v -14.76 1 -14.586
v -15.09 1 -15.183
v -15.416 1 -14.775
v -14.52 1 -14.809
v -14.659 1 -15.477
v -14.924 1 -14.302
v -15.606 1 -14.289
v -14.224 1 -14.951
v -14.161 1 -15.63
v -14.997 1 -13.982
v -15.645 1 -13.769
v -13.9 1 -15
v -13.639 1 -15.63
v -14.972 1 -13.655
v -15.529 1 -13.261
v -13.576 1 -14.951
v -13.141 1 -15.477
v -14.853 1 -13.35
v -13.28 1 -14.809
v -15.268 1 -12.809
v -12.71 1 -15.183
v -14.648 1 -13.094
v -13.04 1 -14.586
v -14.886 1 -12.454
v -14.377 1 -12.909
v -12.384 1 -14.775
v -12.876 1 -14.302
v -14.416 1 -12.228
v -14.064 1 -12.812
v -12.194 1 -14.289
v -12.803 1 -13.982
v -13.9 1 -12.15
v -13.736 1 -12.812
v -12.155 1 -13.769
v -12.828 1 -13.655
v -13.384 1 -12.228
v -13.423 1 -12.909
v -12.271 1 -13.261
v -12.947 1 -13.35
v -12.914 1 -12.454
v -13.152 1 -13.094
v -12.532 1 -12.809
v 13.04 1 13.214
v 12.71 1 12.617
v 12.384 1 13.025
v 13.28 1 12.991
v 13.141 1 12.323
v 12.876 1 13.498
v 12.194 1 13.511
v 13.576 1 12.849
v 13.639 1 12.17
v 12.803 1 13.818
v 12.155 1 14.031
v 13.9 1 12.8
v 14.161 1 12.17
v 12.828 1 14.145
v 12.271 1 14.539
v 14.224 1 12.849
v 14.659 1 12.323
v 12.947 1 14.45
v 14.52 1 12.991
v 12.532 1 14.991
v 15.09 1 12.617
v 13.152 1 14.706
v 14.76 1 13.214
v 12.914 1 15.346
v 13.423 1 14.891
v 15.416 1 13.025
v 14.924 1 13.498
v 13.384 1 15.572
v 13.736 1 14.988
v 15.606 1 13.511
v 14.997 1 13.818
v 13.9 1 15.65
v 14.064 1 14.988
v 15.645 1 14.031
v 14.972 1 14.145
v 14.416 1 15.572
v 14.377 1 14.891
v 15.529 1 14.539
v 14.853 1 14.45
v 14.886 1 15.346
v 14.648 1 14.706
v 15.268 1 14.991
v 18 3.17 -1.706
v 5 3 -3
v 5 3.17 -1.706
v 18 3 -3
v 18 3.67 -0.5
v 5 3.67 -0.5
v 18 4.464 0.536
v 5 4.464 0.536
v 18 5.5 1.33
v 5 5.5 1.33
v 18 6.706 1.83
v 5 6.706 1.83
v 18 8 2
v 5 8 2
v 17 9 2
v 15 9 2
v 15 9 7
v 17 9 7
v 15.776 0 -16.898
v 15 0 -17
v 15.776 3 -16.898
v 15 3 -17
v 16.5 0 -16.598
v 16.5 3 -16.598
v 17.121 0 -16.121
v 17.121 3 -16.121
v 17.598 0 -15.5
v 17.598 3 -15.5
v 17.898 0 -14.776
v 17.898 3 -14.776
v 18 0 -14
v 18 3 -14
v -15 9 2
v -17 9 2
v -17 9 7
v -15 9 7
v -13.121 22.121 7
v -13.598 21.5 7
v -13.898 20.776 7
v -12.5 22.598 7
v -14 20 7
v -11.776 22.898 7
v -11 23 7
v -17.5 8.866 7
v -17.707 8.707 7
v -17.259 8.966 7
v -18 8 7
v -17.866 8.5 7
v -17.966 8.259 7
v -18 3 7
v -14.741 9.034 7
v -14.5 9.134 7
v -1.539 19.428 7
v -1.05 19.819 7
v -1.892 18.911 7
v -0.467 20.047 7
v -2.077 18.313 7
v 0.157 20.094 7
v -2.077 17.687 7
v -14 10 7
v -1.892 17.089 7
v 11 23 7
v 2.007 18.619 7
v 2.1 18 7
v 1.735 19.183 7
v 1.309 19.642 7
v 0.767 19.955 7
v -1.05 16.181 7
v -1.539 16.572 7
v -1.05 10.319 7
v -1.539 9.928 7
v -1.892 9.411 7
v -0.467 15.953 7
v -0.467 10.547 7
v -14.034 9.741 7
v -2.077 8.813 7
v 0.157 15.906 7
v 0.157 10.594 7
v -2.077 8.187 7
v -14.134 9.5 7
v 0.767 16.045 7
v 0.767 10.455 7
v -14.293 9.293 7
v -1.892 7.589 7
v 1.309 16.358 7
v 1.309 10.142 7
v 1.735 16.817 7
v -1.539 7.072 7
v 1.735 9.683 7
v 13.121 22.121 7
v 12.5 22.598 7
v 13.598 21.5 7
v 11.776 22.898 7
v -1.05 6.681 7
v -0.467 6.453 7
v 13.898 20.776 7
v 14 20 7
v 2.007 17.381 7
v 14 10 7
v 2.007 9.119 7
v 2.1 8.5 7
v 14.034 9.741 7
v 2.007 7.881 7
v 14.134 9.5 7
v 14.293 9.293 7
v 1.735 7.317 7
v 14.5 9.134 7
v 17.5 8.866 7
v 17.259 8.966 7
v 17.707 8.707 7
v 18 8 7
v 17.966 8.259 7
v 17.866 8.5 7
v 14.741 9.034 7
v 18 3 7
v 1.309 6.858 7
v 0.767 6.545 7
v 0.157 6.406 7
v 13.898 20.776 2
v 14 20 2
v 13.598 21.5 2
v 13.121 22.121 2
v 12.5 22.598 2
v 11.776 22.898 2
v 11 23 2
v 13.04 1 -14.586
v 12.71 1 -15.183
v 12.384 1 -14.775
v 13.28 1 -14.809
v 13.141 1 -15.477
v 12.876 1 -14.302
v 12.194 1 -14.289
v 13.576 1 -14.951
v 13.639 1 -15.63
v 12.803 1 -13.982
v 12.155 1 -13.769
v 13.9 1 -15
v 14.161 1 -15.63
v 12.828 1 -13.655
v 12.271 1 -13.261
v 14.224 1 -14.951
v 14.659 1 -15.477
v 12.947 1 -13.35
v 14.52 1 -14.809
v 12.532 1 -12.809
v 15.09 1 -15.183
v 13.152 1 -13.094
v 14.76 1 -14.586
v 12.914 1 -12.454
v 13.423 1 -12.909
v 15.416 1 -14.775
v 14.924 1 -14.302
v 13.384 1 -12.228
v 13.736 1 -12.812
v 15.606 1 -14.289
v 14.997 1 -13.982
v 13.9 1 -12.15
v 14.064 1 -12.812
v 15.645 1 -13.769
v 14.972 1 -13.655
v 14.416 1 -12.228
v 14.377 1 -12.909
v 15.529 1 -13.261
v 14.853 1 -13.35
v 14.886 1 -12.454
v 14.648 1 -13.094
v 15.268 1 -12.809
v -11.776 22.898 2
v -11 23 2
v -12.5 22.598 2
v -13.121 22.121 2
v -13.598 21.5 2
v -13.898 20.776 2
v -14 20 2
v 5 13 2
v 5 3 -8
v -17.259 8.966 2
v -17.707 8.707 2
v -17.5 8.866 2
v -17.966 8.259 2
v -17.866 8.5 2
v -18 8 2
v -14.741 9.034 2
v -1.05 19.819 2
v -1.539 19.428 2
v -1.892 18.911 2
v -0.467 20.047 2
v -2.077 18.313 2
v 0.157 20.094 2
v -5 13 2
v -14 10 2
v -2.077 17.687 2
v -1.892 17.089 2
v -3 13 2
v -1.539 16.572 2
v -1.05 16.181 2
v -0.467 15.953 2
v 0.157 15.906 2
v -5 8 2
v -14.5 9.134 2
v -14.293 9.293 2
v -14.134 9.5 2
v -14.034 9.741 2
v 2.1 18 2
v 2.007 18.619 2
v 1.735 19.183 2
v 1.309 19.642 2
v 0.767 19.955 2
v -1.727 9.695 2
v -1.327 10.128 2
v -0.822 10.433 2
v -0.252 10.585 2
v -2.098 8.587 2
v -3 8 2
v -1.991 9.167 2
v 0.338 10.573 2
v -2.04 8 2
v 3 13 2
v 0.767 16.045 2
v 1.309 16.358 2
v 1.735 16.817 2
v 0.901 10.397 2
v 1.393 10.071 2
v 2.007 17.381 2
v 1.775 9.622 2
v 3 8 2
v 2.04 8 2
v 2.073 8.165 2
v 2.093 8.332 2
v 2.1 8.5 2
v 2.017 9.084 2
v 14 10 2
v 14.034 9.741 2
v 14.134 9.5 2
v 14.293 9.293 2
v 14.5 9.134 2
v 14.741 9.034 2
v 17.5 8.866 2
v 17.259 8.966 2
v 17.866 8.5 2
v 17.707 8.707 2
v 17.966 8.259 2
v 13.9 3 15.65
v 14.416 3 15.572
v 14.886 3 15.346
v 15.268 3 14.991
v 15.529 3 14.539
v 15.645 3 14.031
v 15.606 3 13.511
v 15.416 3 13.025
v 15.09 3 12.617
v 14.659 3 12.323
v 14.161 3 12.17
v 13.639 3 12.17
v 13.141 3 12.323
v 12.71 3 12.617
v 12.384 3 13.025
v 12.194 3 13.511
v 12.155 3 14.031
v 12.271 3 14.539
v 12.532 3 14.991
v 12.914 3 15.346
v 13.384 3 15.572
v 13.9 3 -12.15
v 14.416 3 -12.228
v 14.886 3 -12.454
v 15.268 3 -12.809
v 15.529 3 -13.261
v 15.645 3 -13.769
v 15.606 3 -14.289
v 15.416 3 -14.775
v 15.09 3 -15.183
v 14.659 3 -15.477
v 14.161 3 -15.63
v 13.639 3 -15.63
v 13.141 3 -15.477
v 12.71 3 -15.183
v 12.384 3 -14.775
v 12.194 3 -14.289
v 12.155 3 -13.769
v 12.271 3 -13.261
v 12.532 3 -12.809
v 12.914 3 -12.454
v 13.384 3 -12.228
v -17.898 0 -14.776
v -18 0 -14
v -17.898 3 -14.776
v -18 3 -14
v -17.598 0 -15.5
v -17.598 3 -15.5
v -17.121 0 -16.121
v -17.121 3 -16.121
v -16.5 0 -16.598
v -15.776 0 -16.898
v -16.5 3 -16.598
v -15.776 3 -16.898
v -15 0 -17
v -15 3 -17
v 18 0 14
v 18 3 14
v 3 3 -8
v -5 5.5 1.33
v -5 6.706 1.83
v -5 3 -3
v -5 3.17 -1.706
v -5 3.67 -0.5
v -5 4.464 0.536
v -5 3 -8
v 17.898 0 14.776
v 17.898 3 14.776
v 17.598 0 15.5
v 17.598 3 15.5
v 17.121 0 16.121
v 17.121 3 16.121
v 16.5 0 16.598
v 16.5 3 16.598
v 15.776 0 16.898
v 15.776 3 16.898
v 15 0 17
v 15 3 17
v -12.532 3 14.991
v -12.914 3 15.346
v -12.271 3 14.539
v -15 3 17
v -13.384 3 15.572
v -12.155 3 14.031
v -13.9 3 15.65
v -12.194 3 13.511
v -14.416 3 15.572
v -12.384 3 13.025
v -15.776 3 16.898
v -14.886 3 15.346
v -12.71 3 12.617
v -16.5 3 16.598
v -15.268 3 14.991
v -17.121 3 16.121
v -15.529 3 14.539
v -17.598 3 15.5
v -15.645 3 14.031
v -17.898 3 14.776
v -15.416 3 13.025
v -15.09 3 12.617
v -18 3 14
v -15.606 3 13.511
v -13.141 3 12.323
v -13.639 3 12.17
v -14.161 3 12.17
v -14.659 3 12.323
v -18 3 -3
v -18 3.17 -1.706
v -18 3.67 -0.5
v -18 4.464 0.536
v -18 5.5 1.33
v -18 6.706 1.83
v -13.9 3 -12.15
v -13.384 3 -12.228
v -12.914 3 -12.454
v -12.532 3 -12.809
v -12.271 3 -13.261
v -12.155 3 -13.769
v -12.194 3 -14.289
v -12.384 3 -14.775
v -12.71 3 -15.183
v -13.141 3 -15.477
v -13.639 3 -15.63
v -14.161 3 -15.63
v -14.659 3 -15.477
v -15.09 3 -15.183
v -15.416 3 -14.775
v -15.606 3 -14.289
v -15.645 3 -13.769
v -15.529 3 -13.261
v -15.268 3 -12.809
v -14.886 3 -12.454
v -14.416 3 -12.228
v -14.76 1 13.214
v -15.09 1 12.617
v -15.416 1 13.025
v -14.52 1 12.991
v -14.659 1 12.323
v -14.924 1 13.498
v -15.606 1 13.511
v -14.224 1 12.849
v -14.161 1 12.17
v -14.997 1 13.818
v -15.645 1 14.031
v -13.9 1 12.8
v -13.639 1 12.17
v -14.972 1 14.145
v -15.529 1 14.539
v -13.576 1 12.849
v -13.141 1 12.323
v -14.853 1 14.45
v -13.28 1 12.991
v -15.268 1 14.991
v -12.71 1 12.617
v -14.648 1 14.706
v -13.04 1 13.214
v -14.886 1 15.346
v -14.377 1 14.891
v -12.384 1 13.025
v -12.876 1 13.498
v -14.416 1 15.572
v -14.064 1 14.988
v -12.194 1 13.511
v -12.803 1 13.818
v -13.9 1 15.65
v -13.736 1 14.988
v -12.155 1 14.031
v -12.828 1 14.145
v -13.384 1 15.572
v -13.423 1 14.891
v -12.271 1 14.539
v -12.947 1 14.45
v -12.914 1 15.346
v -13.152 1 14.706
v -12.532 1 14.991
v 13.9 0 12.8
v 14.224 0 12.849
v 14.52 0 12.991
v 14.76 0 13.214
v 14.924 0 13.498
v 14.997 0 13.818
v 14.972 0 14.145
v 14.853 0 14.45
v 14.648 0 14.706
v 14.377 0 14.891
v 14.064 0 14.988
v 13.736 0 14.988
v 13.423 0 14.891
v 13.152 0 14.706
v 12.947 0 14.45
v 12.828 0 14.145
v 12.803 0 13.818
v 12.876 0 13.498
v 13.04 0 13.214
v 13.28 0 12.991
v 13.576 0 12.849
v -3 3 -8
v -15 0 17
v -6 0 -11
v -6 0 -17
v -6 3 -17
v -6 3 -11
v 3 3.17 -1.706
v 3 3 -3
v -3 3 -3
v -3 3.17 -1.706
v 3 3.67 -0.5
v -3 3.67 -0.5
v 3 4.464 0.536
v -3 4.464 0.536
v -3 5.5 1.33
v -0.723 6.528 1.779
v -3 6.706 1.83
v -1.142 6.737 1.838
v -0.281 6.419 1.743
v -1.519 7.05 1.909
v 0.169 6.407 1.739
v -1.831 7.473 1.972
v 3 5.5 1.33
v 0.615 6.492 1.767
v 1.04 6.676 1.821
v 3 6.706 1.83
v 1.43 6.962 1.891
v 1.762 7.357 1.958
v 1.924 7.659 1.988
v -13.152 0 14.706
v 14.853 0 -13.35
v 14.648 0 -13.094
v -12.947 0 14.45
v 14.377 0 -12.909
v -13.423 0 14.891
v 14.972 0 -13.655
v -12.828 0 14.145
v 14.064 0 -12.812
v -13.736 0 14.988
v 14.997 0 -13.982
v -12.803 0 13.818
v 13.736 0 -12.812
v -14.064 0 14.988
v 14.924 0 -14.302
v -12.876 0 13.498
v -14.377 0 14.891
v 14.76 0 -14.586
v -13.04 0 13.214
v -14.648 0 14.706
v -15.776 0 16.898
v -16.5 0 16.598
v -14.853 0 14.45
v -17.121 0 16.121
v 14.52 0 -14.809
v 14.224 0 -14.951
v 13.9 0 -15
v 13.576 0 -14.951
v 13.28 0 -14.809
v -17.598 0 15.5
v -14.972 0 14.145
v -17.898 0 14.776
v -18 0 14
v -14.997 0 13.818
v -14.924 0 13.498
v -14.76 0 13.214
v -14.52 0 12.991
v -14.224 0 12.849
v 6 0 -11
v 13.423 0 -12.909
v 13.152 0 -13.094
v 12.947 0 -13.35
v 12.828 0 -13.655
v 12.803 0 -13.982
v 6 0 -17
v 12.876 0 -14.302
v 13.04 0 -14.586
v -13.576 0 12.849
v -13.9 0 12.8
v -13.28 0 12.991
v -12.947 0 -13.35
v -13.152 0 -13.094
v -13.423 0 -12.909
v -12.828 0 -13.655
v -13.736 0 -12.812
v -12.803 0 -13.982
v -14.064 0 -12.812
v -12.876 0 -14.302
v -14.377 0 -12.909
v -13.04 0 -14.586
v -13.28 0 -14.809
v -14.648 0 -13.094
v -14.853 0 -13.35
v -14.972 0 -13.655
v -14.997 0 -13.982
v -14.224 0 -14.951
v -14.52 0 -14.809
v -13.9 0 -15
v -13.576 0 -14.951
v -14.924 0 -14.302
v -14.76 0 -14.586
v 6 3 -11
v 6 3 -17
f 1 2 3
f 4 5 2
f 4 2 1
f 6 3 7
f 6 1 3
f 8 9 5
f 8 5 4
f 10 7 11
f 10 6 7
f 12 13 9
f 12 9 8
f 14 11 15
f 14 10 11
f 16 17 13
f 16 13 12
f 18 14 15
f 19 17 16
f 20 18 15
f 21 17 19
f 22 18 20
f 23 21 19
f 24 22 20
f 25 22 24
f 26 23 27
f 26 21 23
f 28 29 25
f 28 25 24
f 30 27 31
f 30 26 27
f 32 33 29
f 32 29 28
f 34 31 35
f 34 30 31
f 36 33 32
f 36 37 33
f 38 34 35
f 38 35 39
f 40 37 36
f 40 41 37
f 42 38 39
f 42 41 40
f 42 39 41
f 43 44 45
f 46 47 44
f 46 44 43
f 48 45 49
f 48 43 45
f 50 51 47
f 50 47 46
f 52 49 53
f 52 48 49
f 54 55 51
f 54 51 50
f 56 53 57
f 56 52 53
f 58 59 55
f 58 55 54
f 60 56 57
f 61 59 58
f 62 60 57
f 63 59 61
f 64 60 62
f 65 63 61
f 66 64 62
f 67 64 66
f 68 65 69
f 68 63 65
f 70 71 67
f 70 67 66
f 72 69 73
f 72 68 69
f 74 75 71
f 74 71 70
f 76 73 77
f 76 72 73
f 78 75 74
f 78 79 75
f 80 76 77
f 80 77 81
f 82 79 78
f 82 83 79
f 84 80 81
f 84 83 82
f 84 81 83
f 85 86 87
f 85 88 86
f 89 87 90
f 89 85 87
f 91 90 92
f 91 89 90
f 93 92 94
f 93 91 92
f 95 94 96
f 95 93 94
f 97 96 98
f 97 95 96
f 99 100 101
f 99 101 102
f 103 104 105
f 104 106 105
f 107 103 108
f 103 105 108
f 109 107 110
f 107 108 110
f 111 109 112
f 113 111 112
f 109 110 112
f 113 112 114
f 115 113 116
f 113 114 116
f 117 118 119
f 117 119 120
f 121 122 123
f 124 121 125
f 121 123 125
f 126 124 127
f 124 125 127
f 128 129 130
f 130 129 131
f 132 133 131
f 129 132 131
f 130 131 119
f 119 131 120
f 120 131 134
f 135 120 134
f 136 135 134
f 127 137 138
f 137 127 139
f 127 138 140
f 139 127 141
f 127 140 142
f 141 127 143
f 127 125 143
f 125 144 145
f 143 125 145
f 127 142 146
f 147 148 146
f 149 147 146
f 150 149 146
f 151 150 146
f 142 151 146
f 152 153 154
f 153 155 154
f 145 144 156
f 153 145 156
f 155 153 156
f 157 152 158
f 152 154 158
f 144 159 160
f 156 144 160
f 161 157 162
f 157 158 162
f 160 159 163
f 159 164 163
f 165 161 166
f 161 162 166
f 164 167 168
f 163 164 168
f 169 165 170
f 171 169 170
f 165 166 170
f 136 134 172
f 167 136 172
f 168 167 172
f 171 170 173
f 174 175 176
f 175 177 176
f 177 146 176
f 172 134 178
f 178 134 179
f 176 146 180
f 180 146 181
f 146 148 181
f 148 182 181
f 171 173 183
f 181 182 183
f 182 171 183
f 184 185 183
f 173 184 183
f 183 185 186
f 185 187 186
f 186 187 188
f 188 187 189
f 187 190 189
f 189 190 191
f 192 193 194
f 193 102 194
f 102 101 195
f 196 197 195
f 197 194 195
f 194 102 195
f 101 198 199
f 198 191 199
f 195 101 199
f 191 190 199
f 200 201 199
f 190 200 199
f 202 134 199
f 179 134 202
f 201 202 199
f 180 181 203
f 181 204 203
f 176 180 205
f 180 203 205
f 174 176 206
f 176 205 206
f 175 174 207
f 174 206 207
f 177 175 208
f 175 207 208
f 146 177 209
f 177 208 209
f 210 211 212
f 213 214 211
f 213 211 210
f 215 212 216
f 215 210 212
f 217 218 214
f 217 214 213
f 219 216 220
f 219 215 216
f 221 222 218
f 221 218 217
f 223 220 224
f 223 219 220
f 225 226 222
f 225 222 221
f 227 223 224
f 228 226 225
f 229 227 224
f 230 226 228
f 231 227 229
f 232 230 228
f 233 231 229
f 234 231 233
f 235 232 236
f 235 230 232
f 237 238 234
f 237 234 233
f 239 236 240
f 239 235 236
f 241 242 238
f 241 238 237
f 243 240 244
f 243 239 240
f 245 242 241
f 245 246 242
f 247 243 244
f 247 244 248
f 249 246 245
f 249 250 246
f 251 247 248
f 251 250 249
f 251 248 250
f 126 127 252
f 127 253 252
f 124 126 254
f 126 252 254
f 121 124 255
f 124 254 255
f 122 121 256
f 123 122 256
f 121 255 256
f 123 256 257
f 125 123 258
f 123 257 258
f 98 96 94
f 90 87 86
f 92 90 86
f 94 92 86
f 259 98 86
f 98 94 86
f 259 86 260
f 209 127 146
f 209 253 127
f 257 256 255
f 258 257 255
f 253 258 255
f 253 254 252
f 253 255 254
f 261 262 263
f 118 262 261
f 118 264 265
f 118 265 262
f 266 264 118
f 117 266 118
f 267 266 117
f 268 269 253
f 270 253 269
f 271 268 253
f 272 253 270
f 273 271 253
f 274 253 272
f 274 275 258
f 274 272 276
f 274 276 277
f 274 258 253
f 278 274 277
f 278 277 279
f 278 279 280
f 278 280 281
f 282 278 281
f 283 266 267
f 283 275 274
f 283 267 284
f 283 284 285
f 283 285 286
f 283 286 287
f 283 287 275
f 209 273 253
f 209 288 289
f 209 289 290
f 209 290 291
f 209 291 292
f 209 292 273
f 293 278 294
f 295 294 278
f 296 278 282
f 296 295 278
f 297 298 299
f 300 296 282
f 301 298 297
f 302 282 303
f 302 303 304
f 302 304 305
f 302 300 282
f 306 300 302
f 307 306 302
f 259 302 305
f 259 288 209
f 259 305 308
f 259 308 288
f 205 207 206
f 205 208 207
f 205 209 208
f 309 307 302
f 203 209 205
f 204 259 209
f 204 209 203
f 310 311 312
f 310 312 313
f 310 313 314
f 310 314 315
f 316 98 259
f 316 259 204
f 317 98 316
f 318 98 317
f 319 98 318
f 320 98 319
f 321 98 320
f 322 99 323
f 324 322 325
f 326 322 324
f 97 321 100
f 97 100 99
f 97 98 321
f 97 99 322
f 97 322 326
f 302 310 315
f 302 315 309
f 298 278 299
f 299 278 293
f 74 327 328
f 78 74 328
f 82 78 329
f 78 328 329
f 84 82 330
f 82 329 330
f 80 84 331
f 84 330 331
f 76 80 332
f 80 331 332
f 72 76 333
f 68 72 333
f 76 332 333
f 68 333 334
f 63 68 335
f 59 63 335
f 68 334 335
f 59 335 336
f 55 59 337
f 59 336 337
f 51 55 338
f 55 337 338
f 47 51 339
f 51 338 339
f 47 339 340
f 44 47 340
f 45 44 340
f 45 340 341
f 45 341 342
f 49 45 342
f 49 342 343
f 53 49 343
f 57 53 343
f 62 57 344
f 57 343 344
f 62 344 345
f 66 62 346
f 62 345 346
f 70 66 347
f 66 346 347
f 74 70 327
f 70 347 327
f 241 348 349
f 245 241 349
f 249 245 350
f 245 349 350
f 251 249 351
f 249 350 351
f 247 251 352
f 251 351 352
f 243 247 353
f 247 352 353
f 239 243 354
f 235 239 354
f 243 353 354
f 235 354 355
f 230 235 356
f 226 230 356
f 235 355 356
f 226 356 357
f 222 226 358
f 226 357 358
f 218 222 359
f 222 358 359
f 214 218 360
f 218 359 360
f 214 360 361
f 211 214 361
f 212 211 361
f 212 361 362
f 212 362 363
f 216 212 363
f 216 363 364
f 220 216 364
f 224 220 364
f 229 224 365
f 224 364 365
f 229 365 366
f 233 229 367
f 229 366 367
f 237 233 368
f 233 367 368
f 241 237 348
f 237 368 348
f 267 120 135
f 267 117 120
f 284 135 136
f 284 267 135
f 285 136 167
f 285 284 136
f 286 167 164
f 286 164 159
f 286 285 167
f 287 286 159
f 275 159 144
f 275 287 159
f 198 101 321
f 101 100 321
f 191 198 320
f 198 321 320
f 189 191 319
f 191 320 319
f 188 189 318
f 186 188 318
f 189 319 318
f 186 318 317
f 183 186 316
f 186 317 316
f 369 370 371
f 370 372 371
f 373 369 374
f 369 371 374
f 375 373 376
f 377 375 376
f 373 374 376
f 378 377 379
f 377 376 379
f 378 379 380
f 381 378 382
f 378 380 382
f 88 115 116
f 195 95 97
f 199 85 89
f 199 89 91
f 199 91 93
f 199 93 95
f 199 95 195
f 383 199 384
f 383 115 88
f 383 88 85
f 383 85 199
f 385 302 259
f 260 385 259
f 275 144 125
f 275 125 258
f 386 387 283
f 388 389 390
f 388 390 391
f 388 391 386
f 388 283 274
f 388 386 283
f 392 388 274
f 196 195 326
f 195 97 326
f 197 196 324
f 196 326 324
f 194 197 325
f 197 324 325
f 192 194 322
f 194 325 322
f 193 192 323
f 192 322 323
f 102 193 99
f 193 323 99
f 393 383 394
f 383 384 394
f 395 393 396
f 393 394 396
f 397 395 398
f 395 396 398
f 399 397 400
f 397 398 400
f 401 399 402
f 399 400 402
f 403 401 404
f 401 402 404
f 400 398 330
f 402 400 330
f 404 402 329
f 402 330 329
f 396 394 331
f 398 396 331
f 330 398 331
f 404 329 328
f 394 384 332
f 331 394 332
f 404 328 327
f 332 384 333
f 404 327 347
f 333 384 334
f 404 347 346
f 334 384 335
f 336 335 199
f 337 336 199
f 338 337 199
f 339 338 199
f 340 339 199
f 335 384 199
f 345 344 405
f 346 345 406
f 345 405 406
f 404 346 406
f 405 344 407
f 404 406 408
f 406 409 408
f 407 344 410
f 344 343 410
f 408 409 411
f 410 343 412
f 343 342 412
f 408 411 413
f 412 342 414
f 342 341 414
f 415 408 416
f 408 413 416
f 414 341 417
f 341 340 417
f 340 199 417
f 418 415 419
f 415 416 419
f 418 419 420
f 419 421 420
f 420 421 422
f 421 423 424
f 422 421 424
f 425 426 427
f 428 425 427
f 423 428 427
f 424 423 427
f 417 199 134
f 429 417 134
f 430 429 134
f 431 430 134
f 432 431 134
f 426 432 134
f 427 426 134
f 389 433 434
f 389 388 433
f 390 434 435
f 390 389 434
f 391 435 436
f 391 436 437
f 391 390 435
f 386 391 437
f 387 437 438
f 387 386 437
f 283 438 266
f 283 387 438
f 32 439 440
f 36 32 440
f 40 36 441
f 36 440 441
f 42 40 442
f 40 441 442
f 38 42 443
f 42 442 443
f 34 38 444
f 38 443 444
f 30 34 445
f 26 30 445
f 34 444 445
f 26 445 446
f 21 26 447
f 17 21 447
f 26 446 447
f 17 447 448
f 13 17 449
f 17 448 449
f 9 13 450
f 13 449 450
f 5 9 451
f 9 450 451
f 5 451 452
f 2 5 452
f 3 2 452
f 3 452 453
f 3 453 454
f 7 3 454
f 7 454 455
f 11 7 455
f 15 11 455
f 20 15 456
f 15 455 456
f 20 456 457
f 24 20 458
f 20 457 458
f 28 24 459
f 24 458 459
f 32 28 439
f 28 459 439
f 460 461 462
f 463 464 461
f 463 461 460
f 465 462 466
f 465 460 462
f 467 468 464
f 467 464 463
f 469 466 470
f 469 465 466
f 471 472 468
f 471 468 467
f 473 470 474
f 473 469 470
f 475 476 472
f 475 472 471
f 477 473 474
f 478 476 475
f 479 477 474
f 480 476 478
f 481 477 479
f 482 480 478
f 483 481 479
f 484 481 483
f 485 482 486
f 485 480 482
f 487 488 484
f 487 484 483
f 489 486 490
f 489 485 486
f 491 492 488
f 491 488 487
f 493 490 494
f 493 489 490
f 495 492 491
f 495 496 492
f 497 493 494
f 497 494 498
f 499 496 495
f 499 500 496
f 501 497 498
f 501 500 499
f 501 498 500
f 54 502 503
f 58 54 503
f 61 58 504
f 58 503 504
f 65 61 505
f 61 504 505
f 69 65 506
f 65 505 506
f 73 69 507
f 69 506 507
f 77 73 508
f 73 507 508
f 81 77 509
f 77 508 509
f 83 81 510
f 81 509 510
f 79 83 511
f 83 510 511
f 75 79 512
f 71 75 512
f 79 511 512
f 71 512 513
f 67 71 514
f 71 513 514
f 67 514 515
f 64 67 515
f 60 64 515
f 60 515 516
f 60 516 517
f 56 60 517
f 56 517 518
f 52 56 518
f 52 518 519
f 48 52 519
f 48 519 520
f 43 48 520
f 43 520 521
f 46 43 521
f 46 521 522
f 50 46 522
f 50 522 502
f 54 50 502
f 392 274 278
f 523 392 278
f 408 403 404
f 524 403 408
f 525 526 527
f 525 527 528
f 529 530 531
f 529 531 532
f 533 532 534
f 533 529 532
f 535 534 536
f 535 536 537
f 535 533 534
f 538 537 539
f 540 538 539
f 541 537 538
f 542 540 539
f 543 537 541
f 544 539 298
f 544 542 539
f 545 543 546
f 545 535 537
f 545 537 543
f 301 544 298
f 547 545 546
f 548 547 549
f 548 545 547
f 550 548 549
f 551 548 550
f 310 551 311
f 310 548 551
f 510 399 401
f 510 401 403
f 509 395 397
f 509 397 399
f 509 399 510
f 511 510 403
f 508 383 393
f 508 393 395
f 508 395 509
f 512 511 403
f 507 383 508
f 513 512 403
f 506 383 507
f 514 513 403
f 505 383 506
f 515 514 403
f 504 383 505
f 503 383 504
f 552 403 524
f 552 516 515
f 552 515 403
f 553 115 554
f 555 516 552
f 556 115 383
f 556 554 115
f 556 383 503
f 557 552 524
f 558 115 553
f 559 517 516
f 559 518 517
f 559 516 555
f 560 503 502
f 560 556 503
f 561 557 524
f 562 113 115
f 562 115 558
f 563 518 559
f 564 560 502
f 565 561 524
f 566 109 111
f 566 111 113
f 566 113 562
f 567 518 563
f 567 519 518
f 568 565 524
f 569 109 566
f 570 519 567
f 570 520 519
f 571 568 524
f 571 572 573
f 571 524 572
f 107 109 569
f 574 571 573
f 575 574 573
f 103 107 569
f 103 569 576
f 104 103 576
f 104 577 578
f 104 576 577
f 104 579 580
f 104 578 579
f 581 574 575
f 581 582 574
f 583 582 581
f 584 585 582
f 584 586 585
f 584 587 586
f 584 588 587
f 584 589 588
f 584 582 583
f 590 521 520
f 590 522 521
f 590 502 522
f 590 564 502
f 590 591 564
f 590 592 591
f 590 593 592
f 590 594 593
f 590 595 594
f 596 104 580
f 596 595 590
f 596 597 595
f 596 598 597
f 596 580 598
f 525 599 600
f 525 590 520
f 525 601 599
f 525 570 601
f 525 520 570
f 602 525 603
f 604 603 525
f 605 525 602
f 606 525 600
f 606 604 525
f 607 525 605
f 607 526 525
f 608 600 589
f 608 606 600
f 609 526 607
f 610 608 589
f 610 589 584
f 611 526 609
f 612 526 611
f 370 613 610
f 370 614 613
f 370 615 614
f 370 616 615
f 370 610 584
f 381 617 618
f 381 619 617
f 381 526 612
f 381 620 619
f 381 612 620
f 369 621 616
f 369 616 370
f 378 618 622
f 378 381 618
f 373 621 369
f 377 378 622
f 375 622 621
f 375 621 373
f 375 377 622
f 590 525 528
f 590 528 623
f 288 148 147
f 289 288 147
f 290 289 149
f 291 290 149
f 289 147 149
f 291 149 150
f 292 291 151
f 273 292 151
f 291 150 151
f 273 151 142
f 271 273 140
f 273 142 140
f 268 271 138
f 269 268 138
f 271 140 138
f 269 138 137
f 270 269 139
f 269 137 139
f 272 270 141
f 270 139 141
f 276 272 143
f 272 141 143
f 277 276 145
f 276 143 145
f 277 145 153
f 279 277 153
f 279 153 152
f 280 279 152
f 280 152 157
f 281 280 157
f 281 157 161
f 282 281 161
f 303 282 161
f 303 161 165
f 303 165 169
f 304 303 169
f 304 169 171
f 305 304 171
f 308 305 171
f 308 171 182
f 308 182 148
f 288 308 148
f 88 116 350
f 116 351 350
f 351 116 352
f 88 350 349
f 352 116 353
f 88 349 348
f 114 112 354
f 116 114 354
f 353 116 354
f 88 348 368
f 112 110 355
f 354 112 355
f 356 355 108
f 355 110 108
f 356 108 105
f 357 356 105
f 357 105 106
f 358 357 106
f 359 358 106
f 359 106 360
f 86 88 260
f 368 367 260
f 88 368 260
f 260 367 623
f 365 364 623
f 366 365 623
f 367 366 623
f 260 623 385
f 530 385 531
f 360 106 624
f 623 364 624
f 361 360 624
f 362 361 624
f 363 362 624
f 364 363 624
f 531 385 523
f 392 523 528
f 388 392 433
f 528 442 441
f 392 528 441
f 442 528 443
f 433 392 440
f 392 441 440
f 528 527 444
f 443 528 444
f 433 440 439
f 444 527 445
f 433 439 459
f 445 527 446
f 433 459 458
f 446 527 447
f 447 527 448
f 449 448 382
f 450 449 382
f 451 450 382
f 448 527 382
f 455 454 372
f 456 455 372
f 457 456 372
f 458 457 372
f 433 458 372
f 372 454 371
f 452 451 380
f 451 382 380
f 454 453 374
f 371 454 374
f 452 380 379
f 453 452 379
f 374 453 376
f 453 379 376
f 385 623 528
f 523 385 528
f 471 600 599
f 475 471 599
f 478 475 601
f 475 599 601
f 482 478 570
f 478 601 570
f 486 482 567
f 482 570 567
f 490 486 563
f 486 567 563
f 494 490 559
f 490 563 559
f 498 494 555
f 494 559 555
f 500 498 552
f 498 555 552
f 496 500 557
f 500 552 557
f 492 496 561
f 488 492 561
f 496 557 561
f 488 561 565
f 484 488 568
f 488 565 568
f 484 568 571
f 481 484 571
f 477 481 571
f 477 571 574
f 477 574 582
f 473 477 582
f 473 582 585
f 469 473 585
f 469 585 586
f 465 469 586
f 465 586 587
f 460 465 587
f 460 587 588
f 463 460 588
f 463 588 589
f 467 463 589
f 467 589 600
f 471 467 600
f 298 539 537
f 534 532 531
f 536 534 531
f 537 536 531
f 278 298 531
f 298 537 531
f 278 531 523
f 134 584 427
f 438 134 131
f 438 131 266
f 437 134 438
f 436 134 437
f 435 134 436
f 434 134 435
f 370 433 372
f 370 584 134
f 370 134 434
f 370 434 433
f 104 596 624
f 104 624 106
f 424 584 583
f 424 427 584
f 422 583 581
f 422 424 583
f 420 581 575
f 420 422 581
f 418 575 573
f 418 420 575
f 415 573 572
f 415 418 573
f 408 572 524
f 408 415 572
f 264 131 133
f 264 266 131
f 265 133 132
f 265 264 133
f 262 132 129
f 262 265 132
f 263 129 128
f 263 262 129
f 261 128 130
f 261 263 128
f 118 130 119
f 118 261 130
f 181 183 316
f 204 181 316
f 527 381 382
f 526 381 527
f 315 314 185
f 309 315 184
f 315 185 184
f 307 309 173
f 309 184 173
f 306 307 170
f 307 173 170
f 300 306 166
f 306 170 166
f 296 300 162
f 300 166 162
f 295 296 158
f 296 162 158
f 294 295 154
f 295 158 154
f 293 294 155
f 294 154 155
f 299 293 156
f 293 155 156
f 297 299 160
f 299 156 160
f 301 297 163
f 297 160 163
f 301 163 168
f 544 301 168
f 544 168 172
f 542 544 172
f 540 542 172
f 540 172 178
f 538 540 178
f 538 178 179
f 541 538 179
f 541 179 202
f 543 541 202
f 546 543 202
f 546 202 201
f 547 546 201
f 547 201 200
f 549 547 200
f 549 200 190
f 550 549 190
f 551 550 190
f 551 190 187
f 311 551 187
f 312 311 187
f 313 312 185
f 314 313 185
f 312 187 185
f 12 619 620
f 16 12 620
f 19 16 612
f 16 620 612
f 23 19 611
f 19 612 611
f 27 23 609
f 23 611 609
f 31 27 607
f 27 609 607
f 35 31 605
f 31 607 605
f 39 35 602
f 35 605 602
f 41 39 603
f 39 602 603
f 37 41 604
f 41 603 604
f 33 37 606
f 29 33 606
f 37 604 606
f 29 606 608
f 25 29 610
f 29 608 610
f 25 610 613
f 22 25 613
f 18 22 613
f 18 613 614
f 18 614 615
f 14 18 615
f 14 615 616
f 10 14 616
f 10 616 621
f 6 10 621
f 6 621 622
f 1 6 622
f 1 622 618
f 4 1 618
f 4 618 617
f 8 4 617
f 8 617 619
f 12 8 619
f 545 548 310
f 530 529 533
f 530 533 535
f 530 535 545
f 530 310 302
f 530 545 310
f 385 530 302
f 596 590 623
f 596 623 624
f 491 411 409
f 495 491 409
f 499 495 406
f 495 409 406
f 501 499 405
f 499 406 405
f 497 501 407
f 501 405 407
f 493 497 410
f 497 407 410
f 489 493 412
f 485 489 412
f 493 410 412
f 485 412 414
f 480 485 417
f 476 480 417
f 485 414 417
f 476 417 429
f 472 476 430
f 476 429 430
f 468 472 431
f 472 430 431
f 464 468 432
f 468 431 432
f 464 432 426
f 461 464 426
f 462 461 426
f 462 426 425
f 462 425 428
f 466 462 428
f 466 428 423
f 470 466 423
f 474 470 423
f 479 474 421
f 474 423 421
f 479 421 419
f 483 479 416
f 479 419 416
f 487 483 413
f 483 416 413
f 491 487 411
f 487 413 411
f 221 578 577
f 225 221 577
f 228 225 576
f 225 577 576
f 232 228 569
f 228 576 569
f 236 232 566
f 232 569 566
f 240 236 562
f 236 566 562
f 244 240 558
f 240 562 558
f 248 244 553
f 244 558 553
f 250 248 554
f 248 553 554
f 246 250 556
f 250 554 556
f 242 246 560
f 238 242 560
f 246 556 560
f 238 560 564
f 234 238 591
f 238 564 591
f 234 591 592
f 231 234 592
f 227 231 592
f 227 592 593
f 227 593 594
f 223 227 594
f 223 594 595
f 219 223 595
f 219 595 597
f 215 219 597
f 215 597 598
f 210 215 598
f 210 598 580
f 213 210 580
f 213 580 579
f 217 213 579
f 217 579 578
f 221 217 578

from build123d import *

# Parameters (mm, degrees)
EXTRUDE_1_DEPTH     = 3
SKETCH_3_W          = 36
SKETCH_3_H          = 5
EXTRUDE_3_DEPTH     = 6
SKETCH_4_W          = 28
SKETCH_4_H          = 5
EXTRUDE_4_DEPTH     = 14
SKETCH_6_W          = 2
SKETCH_6_H          = 10
EXTRUDE_6_DEPTH     = 10
CHAMFER_1_SIZE      = 10
FILLET_2_R          = 5
SKETCH_12_R         = 2.1
CUT_EXTRUDE_3_DEPTH = 38.802116343
SKETCH_2_R          = 1.1
CUT_EXTRUDE_4_DEPTH = 34.793490497
SKETCH_13_R         = 1.75
CUT_EXTRUDE_5_DEPTH = 2
FILLET_3_R          = 3
FILLET_4_R          = 1


with BuildPart() as part:
    # 草图1 → 凸台-拉伸1 (new body)
    with BuildSketch(Plane(origin=(0, 0, 0), x_dir=(1, 0, 0), z_dir=(0, 1, 0))):
        Polygon((6, 17), (18, 17), (18, -17), (-18, -17), (-18, 17), (-6, 17), (-6, 11), (6, 11), align=None)
    extrude(amount=EXTRUDE_1_DEPTH)

    # 草图3 → 凸台-拉伸3 (add)
    with BuildSketch(Plane(origin=(0, 3, 0), x_dir=(1, 0, 0), z_dir=(0, 1, 0))):
        with Locations((0, -4.5)):
            Rectangle(SKETCH_3_W, SKETCH_3_H)
    extrude(amount=EXTRUDE_3_DEPTH)

    # 草图4 → 凸台-拉伸4 (add)
    with BuildSketch(Plane(origin=(0, 9, 0), x_dir=(1, 0, 0), z_dir=(0, 1, 0))):
        with Locations((0, -4.5)):
            Rectangle(SKETCH_4_W, SKETCH_4_H)
    extrude(amount=EXTRUDE_4_DEPTH)

    # 草图6 → 凸台-拉伸6 (add)
    with BuildSketch(Plane(origin=(0, 3, 0), x_dir=(1, 0, 0), z_dir=(0, 1, 0))):
        with Locations((4, 3)):
            Rectangle(SKETCH_6_W, SKETCH_6_H)
        with Locations((-4, 3)):
            Rectangle(SKETCH_6_W, SKETCH_6_H)
    extrude(amount=EXTRUDE_6_DEPTH)

    # 倒角1
    chamfer_1_edges = [part.edges().sort_by_distance(p)[0] for p in [
        (4, 13, -8),
        (-4, 13, -8),
    ]]
    chamfer(chamfer_1_edges, length=CHAMFER_1_SIZE - 0.0001)  # a hair under: the kernel refuses the full size

    # 圆角2
    fillet_2_edges = [part.edges().sort_by_distance(p)[0] for p in [
        (11.5, 3, 2),
        (0, 3, 2),
        (-11.5, 3, 2),
    ]]
    fillet(fillet_2_edges, radius=FILLET_2_R)

    # 草图12 → 切除-拉伸3 (cut, through all)
    with BuildSketch(Plane.XY.offset(7)):
        with Locations((0, 18)):
            Circle(SKETCH_12_R)
        with Locations((0, 8.5)):
            Circle(SKETCH_12_R)
    extrude(amount=-CUT_EXTRUDE_3_DEPTH, mode=Mode.SUBTRACT)

    # 草图2 → 切除-拉伸4 (cut, through all)
    with BuildSketch(Plane.XZ):
        with Locations(Location((-13.9, 13.9, 0), (0, 0, 270))):
            Circle(SKETCH_2_R)
        with Locations(Location((13.9, 13.9, 0), (0, 0, 270))):
            Circle(SKETCH_2_R)
        with Locations(Location((-13.9, -13.9, 0), (0, 0, 270))):
            Circle(SKETCH_2_R)
        with Locations(Location((13.9, -13.9, 0), (0, 0, 270))):
            Circle(SKETCH_2_R)
    extrude(amount=-CUT_EXTRUDE_4_DEPTH, mode=Mode.SUBTRACT)

    # 草图13 → 切除-拉伸5 (cut)
    with BuildSketch(Plane(origin=(0, 3, 0), x_dir=(1, 0, 0), z_dir=(0, 1, 0))):
        with Locations(Location((-13.9, 13.9, 0), (0, 0, 270))):
            Circle(SKETCH_13_R)
        with Locations(Location((13.9, 13.9, 0), (0, 0, 270))):
            Circle(SKETCH_13_R)
        with Locations(Location((-13.9, -13.9, 0), (0, 0, 270))):
            Circle(SKETCH_13_R)
        with Locations(Location((13.9, -13.9, 0), (0, 0, 270))):
            Circle(SKETCH_13_R)
    extrude(amount=-CUT_EXTRUDE_5_DEPTH, mode=Mode.SUBTRACT)

    # 圆角3
    fillet_3_edges = [part.edges().sort_by_distance(p)[0] for p in [
        (-18, 1.5, -17),
        (18, 1.5, -17),
        (18, 1.5, 17),
        (-18, 1.5, 17),
        (-14, 23, 4.5),
        (14, 23, 4.5),
    ]]
    fillet(fillet_3_edges, radius=FILLET_3_R)

    # 圆角4
    fillet_4_edges = [part.edges().sort_by_distance(p)[0] for p in [
        (18, 9, 4.5),
        (14, 9, 4.5),
        (-18, 9, 4.5),
        (-14, 9, 4.5),
    ]]
    fillet(fillet_4_edges, radius=FILLET_4_R)


solid = part.part
